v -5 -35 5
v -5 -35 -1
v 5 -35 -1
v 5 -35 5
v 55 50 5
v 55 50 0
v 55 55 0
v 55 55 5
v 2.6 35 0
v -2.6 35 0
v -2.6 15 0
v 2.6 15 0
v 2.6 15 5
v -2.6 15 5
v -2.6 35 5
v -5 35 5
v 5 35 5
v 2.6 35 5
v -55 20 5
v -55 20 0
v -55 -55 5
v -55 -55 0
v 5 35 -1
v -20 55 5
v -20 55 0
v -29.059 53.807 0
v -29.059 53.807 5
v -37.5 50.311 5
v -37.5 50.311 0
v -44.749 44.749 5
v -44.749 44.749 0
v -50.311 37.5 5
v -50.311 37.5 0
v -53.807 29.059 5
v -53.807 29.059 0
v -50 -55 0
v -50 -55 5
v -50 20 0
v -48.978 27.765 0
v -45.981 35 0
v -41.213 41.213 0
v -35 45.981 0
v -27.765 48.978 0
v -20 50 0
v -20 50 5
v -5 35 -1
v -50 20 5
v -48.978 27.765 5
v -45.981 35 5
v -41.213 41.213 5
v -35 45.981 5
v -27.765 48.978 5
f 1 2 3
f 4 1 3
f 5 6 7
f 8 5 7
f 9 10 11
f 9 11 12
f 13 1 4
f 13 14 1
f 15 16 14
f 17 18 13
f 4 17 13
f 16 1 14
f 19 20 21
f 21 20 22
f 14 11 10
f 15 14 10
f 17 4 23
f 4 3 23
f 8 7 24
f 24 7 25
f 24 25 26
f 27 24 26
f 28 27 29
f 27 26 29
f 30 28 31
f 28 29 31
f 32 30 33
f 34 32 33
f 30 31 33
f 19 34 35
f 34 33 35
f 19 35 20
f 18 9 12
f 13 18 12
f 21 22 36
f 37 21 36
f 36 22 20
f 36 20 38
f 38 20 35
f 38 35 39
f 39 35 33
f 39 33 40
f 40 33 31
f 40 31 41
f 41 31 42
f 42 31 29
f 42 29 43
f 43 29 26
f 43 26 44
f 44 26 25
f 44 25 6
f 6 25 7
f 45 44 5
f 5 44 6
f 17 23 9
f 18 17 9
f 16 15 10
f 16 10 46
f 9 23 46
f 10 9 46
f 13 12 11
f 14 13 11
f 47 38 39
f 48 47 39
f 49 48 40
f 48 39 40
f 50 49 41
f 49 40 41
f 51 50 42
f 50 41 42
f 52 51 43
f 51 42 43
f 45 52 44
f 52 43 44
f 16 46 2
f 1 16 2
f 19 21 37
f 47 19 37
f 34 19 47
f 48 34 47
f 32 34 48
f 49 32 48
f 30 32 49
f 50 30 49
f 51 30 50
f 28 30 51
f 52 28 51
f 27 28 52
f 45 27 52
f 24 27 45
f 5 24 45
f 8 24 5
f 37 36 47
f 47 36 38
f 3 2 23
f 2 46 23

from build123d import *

# Parameters (mm, degrees)
F1_DEPTH = 5
F0_W     = 5.2
F0_H     = 20
F2_DEPTH = 1
F3_DEPTH = 5


with BuildPart() as f1:
    # F0 (on Top) → F1 (new body)
    with BuildSketch(Plane.XY):
        with BuildLine():
            Line((55, 50), (55, 55))
            Line((55, 55), (-20, 55))
            ThreePointArc((-20, 55), (-44.748737, 44.748737), (-55, 20))
            Line((-55, 20), (-55, -55))
            Line((-55, -55), (-50, -55))
            Line((-50, -55), (-50, 20))
            ThreePointArc((-50, 20), (-41.213203, 41.213203), (-20, 50))
            Line((-20, 50), (55, 50))
        make_face()
    extrude(amount=F1_DEPTH)


with BuildPart() as f2:
    # F0 (on Top) → F2 (new body)
    with BuildSketch(Plane.XY):
        Polygon((-5, -35), (5, -35), (5, 35), (2.6, 35), (2.6, 15), (-2.6, 15), (-2.6, 35), (-5, 35), align=None)
        with Locations((0, 25)):
            Rectangle(F0_W, F0_H)
    extrude(amount=-F2_DEPTH)

    # F0 (on Top) → F3 (join)
    with BuildSketch(Plane.XY):
        Polygon((-5, -35), (5, -35), (5, 35), (2.6, 35), (2.6, 15), (-2.6, 15), (-2.6, 35), (-5, 35), align=None)
    extrude(amount=F3_DEPTH)


solid = Compound([f1.part, f2.part])
